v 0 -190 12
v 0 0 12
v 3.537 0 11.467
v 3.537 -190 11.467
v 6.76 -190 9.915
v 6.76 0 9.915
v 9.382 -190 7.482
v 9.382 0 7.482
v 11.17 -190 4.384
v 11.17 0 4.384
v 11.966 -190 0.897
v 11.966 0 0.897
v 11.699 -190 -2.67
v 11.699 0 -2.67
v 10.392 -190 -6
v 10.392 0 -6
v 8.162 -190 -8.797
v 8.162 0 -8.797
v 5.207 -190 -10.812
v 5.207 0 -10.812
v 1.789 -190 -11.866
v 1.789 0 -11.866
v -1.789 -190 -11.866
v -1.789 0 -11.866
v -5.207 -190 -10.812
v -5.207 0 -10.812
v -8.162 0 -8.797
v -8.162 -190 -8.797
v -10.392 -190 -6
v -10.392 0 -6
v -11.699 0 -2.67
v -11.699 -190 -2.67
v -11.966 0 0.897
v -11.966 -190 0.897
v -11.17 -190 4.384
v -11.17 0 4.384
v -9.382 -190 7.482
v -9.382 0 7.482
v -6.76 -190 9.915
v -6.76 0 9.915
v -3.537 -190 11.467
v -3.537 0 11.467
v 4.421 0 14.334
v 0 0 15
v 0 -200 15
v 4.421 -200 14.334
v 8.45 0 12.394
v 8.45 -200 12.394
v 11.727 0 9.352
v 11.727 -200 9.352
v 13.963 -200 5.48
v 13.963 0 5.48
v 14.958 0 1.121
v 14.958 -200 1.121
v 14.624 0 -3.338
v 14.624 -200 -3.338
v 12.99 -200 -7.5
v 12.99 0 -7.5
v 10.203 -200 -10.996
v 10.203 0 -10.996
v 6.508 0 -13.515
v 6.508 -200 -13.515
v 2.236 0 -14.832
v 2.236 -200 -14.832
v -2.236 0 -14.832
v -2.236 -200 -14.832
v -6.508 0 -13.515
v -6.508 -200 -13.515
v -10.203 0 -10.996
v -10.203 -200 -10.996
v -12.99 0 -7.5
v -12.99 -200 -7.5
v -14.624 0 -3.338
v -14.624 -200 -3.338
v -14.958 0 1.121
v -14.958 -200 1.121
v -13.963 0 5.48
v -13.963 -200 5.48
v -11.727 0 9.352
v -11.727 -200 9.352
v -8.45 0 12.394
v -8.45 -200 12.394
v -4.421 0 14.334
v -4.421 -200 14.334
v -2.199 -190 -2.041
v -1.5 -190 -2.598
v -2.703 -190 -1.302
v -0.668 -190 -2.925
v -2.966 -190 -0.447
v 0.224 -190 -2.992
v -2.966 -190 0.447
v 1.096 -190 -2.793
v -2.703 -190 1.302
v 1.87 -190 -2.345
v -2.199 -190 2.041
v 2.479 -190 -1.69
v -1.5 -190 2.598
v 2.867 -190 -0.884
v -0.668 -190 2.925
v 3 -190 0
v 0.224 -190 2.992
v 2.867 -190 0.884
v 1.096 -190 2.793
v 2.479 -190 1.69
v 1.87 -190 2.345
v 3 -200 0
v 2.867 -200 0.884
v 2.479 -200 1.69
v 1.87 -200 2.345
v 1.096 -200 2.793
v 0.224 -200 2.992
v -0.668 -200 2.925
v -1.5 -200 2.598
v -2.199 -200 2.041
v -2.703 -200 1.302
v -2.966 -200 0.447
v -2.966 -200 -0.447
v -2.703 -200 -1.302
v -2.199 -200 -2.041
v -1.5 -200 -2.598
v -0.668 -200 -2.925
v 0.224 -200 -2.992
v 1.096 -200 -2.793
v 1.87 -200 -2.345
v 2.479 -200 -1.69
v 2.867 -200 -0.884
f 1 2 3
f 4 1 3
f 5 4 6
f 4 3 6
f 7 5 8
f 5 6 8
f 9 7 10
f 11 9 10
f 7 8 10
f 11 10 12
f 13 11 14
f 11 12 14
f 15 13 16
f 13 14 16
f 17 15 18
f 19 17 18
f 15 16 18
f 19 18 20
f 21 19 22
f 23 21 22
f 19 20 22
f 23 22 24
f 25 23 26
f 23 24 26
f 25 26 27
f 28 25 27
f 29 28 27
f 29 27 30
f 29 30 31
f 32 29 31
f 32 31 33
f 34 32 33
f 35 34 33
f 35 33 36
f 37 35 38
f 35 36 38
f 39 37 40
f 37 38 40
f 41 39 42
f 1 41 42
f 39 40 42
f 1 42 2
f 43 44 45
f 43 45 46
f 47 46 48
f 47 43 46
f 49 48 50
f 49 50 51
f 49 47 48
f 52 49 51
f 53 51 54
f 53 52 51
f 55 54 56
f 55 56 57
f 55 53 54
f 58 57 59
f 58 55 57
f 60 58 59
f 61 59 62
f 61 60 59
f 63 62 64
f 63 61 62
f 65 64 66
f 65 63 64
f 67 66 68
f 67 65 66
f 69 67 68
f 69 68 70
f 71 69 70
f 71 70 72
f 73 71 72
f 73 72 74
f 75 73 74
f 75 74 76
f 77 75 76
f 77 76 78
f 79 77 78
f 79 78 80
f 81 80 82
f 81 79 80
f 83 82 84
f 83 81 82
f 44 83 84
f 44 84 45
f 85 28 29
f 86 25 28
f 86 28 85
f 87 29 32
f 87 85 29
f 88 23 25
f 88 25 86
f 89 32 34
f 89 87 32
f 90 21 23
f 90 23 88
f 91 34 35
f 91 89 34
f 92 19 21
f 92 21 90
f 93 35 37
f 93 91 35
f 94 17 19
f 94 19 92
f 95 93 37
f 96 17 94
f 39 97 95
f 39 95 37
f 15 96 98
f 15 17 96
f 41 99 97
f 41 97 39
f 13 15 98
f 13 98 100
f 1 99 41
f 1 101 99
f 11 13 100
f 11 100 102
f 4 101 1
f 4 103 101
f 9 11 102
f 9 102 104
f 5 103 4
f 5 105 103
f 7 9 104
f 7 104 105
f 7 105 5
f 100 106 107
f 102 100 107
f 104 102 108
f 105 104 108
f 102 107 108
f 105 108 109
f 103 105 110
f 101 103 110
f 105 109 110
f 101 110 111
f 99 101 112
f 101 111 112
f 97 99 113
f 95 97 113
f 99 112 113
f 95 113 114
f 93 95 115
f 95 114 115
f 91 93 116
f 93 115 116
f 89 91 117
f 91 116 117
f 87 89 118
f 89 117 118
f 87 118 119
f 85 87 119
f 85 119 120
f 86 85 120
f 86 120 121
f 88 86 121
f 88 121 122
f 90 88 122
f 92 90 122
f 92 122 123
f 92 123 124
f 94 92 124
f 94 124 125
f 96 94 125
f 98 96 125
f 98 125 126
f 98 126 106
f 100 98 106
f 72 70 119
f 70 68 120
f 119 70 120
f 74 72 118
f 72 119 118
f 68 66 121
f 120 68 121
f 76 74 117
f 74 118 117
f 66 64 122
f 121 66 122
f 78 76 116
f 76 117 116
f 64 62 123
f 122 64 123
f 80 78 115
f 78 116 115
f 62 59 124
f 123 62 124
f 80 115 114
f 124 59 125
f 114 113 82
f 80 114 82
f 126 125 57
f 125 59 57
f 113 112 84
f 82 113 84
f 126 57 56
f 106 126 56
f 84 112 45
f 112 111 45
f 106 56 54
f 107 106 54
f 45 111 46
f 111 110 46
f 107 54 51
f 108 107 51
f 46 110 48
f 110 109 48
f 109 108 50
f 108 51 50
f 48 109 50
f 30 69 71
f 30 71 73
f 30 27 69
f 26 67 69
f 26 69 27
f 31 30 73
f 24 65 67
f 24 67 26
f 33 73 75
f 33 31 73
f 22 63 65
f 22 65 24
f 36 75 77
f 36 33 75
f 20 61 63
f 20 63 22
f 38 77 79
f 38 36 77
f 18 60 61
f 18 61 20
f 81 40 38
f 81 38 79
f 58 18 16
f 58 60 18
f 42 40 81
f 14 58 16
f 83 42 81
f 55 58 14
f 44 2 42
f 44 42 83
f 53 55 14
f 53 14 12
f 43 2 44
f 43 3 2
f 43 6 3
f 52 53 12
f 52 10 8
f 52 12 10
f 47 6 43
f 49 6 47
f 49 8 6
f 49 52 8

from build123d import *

# Parameters (mm, degrees)
SKETCH1_R                   = 15
EXTRUDE1_DEPTH              = 200
SKETCH2_R                   = 12
CUT_EXTRUDE1_DEPTH          = 190
M6_TAPPED_HOLE2_D           = 5
M6_TAPPED_HOLE2_DEPTH       = 15
M6_TAPPED_HOLE2_CBORE_D     = 6
M6_TAPPED_HOLE2_CBORE_DEPTH = 12
M6_TAPPED_HOLE2_TIP         = 1.502151548


with BuildPart() as part:
    # Sketch1 → Extrude1 (new body)
    with BuildSketch(Plane(origin=(0, 0, 0), x_dir=(1, 0, 0), z_dir=(0, 1, 0))):
        with Locations(Location((0, 0, 0), (0, 0, 270))):
            Circle(SKETCH1_R)
    extrude(amount=-EXTRUDE1_DEPTH)

    # Sketch2 → Cut-Extrude1 (cut)
    with BuildSketch(Plane(origin=(0, 0, 0), x_dir=(1, 0, 0), z_dir=(0, 1, 0))):
        with Locations(Location((0, 0, 0), (0, 0, 270))):
            Circle(SKETCH2_R)
    extrude(amount=-CUT_EXTRUDE1_DEPTH, mode=Mode.SUBTRACT)

    # M6 Tapped Hole2
    with Locations(Plane.XZ.offset(200)):
        with Locations((0, 0)):
            CounterBoreHole(M6_TAPPED_HOLE2_D / 2, M6_TAPPED_HOLE2_CBORE_D / 2, M6_TAPPED_HOLE2_CBORE_DEPTH, depth=M6_TAPPED_HOLE2_DEPTH)
            with Locations((0, 0, -(M6_TAPPED_HOLE2_DEPTH + M6_TAPPED_HOLE2_TIP / 2))):  # 118° drill point
                Cone(0, M6_TAPPED_HOLE2_D / 2, M6_TAPPED_HOLE2_TIP, mode=Mode.SUBTRACT)


solid = part.part
